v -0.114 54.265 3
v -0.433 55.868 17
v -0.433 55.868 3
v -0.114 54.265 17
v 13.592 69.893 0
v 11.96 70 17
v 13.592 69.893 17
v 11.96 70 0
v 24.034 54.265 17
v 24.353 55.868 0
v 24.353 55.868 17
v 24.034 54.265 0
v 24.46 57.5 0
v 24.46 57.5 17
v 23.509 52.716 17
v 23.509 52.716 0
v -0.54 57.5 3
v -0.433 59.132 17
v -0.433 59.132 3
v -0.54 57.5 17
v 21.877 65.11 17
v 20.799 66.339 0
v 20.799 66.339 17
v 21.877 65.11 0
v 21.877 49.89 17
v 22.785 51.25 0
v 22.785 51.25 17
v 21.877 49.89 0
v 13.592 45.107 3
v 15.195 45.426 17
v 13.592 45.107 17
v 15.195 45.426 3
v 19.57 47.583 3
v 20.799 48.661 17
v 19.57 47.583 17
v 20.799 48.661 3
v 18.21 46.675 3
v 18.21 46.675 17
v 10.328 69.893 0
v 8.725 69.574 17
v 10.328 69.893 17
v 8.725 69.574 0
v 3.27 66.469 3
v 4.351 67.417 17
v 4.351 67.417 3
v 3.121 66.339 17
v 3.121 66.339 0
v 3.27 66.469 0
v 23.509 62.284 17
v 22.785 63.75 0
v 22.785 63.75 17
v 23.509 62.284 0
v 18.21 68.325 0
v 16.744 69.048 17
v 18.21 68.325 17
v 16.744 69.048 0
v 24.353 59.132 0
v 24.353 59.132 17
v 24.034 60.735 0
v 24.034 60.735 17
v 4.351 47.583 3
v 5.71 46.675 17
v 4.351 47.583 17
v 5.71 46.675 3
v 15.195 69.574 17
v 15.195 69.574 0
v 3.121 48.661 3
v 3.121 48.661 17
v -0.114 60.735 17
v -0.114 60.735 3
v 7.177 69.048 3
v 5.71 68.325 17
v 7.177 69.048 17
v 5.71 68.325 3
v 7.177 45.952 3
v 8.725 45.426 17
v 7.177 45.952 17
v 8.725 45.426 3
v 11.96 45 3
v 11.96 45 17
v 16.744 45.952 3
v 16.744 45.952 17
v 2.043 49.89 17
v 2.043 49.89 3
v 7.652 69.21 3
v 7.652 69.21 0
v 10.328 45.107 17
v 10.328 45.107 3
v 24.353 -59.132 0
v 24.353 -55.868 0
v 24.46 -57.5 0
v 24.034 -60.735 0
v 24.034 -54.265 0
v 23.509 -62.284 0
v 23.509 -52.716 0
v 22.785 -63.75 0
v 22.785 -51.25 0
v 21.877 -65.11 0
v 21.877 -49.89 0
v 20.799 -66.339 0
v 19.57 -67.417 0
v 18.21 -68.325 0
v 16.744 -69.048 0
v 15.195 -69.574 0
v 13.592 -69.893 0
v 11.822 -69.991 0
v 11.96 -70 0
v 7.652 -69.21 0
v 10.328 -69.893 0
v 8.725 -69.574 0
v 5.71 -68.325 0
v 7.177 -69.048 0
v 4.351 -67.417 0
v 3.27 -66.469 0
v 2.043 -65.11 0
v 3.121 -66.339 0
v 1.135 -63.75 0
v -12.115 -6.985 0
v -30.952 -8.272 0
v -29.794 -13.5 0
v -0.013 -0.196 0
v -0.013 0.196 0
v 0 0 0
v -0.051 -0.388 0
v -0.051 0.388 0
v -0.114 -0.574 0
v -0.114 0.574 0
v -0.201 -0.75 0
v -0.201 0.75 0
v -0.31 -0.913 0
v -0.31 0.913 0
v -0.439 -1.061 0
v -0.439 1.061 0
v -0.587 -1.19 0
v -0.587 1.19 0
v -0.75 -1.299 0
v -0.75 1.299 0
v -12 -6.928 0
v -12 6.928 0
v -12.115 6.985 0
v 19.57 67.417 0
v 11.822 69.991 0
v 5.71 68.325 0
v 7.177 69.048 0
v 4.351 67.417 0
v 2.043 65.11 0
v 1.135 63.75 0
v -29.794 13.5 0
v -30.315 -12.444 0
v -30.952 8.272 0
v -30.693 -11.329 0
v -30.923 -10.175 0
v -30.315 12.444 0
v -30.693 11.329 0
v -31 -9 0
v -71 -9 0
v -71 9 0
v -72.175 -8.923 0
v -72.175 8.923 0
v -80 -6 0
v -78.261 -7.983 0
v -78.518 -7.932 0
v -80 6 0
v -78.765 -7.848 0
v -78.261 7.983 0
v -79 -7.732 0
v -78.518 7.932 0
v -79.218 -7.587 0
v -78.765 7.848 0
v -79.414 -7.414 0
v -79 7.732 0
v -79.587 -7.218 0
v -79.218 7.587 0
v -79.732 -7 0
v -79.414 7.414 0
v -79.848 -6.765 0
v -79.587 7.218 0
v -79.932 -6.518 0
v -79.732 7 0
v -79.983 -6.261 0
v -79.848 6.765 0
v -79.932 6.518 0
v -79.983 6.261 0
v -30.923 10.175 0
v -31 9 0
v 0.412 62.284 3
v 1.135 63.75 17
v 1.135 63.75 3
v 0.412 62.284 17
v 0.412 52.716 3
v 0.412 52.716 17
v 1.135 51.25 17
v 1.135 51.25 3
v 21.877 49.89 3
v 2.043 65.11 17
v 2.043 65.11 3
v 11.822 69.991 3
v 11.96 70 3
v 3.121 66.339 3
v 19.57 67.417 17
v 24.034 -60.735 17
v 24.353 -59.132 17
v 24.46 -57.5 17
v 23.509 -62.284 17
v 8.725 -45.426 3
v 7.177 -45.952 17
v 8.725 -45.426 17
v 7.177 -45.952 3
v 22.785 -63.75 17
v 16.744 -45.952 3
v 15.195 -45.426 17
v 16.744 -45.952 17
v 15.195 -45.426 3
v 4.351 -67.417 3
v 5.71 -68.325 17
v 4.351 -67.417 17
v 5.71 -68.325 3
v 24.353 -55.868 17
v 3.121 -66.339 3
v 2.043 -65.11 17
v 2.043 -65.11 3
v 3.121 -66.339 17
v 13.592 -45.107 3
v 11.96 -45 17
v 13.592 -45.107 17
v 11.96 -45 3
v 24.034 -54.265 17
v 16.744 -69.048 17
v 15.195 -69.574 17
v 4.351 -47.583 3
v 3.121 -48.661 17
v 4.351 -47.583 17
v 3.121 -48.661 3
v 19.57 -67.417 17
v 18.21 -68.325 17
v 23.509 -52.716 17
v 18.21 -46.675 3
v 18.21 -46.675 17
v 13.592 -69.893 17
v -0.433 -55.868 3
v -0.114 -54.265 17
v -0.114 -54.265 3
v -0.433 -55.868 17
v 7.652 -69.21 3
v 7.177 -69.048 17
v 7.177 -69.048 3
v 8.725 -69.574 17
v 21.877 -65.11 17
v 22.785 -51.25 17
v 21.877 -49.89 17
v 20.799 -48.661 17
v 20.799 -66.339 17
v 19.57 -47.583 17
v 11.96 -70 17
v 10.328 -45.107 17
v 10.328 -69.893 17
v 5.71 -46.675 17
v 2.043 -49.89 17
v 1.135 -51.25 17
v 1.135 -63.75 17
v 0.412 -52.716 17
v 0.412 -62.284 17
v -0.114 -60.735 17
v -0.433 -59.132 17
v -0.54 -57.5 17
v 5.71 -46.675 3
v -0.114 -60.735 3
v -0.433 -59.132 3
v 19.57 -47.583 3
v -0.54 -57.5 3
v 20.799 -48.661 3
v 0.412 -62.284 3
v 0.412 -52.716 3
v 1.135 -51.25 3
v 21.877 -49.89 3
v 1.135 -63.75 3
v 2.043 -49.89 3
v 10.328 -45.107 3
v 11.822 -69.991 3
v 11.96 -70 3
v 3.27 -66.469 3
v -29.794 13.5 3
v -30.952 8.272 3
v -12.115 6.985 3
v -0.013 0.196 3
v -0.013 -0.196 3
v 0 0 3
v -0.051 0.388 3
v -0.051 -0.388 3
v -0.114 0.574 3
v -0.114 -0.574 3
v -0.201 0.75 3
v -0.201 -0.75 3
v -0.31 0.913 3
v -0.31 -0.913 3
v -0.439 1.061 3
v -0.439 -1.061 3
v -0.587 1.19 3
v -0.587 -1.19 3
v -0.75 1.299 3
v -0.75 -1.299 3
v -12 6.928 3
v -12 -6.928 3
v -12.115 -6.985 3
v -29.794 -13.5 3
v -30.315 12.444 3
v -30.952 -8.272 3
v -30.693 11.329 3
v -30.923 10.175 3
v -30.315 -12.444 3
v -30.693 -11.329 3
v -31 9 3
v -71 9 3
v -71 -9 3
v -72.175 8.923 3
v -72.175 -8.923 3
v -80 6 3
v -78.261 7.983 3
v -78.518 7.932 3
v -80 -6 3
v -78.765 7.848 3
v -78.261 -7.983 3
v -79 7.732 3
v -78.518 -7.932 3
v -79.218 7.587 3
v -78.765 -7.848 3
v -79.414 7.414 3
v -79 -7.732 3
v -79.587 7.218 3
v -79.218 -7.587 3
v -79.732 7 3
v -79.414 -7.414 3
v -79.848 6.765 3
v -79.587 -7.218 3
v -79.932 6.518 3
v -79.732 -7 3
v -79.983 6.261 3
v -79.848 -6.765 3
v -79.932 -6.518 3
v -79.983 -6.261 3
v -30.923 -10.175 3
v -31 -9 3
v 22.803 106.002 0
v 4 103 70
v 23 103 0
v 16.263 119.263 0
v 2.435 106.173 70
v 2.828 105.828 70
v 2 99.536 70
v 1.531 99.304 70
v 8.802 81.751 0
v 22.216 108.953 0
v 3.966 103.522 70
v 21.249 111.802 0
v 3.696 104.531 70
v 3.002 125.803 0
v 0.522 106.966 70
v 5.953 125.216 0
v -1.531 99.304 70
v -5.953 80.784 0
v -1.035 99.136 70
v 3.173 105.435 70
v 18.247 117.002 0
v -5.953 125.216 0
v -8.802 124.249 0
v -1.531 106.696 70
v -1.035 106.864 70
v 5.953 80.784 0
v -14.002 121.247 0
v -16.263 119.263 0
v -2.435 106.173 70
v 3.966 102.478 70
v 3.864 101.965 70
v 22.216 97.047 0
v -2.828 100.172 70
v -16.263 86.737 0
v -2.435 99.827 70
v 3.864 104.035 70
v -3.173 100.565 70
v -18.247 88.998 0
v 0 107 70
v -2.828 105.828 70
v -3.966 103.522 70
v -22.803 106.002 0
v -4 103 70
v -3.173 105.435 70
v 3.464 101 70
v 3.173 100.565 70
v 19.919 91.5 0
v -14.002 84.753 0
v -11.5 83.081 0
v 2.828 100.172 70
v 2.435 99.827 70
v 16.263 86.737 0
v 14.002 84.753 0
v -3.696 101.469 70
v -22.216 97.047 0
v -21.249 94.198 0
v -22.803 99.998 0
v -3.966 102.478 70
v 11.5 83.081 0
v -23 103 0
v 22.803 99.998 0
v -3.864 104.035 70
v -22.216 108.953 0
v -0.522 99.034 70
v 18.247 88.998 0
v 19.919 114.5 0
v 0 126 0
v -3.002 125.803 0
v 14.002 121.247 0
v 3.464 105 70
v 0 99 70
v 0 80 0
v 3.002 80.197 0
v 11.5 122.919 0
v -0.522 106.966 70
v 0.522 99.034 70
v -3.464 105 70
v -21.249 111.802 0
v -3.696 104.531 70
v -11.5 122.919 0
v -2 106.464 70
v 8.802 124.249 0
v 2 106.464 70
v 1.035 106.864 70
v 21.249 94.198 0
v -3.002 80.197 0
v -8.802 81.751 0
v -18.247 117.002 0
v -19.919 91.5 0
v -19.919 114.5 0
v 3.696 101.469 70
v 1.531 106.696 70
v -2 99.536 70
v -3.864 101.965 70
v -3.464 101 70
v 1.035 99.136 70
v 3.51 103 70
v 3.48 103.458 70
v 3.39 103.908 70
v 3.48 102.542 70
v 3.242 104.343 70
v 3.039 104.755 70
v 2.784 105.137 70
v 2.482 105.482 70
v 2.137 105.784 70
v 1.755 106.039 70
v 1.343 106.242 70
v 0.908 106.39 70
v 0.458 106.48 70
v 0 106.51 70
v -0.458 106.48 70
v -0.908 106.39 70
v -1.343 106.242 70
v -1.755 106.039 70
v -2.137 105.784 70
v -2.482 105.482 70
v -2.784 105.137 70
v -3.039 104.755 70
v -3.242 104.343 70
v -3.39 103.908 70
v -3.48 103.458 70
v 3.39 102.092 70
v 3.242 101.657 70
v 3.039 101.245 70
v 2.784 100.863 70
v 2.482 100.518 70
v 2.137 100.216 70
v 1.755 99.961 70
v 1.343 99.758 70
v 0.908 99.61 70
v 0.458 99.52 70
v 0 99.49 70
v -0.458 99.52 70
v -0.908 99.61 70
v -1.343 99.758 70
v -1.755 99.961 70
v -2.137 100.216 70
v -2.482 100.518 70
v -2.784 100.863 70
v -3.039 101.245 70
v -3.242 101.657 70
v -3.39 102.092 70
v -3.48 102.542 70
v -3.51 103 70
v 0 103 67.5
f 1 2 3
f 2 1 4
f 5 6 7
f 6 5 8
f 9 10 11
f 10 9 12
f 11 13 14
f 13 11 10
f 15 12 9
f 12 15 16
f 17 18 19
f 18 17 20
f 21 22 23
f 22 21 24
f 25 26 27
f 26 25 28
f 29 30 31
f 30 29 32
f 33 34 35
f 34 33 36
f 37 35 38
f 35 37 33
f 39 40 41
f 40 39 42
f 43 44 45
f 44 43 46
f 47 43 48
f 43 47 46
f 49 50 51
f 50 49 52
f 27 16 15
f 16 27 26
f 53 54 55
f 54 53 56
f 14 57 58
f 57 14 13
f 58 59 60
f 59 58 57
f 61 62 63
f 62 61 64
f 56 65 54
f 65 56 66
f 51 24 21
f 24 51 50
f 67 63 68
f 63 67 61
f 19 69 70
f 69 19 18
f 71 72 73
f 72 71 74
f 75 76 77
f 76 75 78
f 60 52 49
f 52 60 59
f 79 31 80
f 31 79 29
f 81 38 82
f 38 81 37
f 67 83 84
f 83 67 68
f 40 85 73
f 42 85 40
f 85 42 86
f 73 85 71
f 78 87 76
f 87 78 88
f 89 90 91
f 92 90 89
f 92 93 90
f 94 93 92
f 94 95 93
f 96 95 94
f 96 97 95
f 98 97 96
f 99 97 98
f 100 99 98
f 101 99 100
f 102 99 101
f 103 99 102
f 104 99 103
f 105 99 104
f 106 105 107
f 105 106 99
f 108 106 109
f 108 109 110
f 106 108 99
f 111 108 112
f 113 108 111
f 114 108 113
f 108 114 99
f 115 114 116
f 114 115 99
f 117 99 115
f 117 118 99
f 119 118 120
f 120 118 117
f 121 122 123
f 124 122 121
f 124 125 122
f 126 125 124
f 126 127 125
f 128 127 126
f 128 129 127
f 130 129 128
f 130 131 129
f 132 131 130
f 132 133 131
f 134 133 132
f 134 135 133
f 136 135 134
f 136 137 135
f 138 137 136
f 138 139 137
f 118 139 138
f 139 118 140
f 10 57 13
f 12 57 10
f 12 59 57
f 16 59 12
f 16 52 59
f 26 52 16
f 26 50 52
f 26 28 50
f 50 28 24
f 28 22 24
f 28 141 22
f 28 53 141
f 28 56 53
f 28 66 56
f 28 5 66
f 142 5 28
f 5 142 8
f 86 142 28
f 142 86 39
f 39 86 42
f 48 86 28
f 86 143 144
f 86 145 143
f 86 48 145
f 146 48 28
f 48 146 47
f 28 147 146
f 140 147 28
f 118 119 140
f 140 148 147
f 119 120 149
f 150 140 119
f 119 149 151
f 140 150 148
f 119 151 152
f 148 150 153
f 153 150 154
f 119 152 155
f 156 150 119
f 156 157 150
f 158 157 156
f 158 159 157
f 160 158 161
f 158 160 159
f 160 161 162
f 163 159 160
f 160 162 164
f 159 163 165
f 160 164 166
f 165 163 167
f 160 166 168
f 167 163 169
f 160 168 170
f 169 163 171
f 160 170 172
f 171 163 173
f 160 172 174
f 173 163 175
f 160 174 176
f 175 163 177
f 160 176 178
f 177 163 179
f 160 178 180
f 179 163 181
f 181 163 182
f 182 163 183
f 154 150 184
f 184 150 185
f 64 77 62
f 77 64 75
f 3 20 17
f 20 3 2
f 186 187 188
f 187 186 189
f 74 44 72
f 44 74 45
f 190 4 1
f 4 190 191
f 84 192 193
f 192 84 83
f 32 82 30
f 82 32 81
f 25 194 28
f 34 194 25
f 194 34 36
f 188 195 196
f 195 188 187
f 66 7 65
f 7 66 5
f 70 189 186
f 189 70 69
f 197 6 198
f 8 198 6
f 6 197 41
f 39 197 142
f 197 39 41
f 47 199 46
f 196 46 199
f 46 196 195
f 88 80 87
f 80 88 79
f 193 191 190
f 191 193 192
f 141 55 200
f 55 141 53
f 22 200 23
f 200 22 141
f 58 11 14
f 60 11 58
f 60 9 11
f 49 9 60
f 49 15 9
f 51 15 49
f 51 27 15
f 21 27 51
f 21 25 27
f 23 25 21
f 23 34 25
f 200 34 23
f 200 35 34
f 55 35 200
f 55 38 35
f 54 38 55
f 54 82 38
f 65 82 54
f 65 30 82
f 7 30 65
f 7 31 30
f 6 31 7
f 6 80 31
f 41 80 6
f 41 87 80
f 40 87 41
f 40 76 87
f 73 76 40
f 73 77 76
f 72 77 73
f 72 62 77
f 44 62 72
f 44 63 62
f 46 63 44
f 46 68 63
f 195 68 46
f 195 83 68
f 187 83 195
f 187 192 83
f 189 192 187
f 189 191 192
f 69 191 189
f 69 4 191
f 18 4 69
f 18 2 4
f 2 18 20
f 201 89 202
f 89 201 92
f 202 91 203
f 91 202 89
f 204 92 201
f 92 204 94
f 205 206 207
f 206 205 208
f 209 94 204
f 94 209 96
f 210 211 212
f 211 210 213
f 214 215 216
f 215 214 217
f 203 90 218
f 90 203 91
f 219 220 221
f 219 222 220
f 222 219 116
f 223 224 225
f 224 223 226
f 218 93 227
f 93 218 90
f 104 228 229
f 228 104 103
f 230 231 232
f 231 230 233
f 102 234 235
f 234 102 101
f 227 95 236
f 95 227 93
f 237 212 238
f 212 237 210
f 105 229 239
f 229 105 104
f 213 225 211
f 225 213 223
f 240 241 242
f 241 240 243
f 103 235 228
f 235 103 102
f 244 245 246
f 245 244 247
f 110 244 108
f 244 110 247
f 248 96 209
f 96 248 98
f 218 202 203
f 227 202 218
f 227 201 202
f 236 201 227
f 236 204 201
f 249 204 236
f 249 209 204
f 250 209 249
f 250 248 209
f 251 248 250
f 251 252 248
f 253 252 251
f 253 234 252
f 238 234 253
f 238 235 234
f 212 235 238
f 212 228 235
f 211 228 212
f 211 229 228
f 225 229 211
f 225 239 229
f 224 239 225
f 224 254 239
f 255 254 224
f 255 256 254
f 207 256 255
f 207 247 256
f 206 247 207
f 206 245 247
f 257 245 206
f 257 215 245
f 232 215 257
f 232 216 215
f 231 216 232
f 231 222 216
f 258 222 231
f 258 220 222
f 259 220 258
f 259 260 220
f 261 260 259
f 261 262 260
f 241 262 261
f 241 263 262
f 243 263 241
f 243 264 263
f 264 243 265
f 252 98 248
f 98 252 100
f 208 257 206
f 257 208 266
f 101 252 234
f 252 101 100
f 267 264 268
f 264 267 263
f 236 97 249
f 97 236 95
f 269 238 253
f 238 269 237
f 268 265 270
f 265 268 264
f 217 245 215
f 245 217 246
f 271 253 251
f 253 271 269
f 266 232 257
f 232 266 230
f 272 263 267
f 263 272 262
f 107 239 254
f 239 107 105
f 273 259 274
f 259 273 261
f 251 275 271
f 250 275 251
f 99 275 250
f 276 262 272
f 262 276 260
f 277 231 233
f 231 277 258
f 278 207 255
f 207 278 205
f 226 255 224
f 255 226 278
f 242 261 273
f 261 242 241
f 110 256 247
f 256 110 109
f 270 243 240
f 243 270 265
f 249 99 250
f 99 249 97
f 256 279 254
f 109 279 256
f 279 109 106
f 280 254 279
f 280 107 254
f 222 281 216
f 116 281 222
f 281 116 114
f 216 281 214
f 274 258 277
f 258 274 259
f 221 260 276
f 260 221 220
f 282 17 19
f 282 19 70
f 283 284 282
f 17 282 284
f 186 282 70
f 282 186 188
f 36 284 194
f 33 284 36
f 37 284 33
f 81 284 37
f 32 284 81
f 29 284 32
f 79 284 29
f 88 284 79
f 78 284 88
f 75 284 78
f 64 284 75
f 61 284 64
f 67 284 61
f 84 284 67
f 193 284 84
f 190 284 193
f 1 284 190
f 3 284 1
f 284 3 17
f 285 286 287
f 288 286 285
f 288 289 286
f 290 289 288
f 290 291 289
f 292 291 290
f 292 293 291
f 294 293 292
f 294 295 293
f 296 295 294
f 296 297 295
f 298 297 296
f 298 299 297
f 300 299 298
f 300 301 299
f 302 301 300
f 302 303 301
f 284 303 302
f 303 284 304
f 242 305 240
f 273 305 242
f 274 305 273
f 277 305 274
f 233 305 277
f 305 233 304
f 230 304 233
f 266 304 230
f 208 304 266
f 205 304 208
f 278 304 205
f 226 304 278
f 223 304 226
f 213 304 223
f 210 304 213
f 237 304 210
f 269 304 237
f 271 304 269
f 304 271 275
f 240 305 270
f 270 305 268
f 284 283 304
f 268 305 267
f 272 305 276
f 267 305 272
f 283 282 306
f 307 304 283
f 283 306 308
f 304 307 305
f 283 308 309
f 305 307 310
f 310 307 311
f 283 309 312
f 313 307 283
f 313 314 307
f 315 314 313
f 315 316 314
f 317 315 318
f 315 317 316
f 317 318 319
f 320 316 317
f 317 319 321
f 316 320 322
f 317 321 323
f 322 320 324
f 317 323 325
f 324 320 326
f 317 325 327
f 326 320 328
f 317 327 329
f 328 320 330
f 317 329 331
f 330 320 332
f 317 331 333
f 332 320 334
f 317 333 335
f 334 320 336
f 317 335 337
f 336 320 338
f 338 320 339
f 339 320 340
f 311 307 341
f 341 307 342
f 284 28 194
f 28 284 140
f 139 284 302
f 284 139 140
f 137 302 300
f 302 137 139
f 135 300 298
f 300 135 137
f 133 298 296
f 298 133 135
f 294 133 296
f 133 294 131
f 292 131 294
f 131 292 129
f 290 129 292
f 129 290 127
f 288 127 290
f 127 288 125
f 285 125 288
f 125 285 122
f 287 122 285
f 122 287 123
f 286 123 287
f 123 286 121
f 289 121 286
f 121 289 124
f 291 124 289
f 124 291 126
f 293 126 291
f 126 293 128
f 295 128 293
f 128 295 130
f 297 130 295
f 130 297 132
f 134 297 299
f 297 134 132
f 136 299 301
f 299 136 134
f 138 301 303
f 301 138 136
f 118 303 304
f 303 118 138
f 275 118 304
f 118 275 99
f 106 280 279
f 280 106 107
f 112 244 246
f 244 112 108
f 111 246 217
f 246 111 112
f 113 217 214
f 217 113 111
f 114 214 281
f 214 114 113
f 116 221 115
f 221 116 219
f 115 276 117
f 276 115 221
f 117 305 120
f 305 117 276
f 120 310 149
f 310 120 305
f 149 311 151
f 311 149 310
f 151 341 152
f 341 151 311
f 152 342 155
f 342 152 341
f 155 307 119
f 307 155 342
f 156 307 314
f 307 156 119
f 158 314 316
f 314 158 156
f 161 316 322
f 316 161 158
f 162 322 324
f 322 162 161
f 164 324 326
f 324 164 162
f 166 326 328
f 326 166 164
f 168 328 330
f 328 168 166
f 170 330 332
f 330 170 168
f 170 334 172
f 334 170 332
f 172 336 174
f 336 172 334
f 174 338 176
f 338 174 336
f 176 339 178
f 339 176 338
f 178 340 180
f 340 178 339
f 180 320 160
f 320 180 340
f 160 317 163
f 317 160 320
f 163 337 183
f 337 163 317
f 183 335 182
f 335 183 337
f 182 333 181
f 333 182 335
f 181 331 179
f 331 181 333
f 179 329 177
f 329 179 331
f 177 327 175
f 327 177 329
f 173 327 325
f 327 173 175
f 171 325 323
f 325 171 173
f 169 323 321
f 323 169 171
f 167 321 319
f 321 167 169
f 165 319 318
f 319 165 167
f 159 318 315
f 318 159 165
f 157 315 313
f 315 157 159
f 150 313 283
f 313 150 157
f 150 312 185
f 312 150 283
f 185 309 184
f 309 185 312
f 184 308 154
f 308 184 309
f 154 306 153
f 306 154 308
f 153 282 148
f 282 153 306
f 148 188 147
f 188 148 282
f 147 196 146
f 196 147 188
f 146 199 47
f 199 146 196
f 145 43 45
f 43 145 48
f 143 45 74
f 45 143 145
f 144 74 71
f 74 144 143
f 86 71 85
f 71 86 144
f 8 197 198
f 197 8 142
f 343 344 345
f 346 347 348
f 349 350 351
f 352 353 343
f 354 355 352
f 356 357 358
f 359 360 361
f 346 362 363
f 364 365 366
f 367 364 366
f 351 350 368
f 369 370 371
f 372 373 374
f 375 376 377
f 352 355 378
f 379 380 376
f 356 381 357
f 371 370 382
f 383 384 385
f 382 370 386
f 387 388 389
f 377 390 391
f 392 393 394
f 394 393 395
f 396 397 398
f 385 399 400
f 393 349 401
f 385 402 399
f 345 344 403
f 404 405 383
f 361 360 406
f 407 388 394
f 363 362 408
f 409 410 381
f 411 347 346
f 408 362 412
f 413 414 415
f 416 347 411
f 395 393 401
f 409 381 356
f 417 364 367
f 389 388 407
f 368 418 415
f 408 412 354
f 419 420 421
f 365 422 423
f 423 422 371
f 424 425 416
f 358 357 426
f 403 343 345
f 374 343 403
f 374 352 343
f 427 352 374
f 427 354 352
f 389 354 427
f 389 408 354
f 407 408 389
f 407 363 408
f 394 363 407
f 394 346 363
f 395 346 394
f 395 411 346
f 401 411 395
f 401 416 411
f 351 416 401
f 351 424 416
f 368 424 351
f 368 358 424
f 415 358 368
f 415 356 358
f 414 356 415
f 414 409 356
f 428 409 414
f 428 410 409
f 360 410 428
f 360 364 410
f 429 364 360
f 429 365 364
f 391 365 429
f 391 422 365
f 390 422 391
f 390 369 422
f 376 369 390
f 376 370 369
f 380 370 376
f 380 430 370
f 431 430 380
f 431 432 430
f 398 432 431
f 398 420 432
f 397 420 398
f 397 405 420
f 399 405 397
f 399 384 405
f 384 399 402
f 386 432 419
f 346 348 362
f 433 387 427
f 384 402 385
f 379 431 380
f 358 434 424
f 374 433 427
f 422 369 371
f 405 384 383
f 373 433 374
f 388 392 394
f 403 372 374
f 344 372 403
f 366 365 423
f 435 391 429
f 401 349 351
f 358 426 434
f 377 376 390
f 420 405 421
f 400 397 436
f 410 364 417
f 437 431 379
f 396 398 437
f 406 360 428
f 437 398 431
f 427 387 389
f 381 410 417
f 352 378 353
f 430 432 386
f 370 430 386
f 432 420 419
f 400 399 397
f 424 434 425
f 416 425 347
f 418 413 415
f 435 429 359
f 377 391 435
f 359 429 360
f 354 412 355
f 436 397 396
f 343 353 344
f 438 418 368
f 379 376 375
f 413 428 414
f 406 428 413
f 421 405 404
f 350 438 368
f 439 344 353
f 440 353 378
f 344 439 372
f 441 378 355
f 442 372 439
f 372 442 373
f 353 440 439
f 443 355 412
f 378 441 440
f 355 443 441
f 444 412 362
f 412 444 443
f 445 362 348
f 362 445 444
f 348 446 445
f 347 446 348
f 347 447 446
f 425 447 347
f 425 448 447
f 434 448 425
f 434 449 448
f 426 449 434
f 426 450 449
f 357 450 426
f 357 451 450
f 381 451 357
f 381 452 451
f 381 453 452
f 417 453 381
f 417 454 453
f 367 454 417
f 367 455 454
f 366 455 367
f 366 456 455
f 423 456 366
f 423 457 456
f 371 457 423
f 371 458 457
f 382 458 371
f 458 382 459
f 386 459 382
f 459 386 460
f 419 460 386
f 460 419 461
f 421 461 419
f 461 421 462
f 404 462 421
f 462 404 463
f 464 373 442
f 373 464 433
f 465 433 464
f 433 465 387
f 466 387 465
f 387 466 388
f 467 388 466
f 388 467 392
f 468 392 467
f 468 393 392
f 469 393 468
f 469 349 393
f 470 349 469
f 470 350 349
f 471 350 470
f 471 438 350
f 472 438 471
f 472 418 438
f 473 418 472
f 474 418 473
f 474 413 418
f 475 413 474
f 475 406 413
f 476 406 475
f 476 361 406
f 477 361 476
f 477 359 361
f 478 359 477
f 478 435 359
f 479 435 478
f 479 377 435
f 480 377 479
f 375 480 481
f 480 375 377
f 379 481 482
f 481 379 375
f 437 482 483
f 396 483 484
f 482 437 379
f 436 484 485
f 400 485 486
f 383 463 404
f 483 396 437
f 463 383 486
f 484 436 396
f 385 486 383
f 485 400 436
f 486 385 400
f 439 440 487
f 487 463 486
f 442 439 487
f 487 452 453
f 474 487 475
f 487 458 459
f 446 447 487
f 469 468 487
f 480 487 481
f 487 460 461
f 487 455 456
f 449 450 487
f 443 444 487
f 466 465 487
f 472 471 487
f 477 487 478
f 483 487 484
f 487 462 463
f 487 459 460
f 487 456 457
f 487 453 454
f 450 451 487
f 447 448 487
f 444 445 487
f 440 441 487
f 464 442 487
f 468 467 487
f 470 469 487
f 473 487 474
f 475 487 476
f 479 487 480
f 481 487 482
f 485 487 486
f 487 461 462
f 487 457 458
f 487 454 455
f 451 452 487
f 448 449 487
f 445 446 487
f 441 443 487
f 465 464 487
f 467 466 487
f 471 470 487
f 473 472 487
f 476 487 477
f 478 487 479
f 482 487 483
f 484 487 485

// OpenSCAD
// @name Balancing Bird
// @description Center-of-mass toy: a bird that balances on its beak tip, plus a cone stand to perch it on.
// @tags toy, physics, balance, bird, educational
//
// The classic balancing-bird toy. The bird is a flat plate with
// forward-swept wings; heavy wingtip bosses hang BELOW beak level and
// ahead of the beak, pulling the center of mass to a point directly
// under the beak tip. Resting the beak in the stand's dimple, the bird
// hangs pendulum-stable because its center of mass sits below the
// support point.
//
// The bird is modeled in its balance frame: BEAK TIP AT THE ORIGIN,
// +x forward, z up. Balance is verified on the rendered mesh with
// scripts/check_stl.js (volume centroid, uniform-density assumption -
// valid for a solid single-material print):
//
//   BALANCE REQUIREMENT (assert-style, checked on the exported mesh):
//     |centroid.x| <= 1.5  &&  |centroid.y| <= 1.5  &&  centroid.z < 0
//   VERIFIED at the defaults below (weight_mode="solid",
//   wingspan=140, sweep_angle=35, body_length=80, plate_thickness=3,
//   pocket_diameter=20, tip_drop=14):
//     centroid = [-0.42, 0.00, -2.87] mm, volume = 26631 mm^3
//   i.e. the center of mass sits 0.4mm behind and 2.9mm BELOW the beak
//   tip contact point - pendulum-stable. If you change bird parameters,
//   re-render and re-check the centroid (uniform density assumed).
//
// Wingtip weights: weight_mode="solid" prints solid PLA bosses sized
// to balance on their own. weight_mode="coin" opens a pocket in each
// boss (facing DOWN in use, facing UP on the print bed) for coins -
// with EMPTY pockets the centroid measures [-3.29, 0.00, -1.22] (tail
// heavy): coin mode balances once coins are inserted (coin mass sits
// low and forward of the beak, which restores and deepens stability).
//
// Printing: the bird prints FLAT ON ITS BACK - its top surface is one
// flat plane (plate top, boss tops flush), so flipped upside-down the
// whole silhouette rests on the bed and the wingtip bosses are plain
// vertical cylinders growing upward. No supports, no bridges; coin
// pockets print as upward-facing blind holes. The stand prints upright
// on its base (wall angle ~74 degrees from horizontal, dimple faces up).

/* [Bird] */
// Wingtip-to-wingtip span (mm)
wingspan = 140; // [100:10:200]

// Forward wing sweep, degrees from straight-sideways
sweep_angle = 35; // [20:1:45]

// Beak tip to tail length (mm)
body_length = 80; // [60:5:110]

// Plate thickness (mm)
plate_thickness = 3; // [2:0.5:5]

/* [Wingtip Weights] */
// Solid printed tips, or open pockets for coins
weight_mode = "solid"; // ["solid", "coin"]

// Weight pocket diameter (mm) - also sets boss size (pocket + 5mm wall). 20 fits most small coins.
pocket_diameter = 20; // [14:1:26]

// Pocket depth for coins (mm)
pocket_depth = 8; // [4:1:12]

// How far the wingtip bosses hang below beak level (mm)
tip_drop = 14; // [8:2:24]

/* [Stand] */
// Cone stand height (mm)
stand_height = 70; // [50:5:100]

// Cone stand base diameter (mm)
stand_base = 46; // [36:2:60]

/* [Display] */
// What to show
_display_mode = "all"; // ["all", "bird", "stand", "balanced"]

/* [Advanced] */
$fn = 48;

// ---- Derived geometry (balance frame: beak tip at origin) ----

_t = plate_thickness;
_half = wingspan / 2;
_wall = 2.5;
_boss_d = pocket_diameter + 2 * _wall;

// Silhouette anchors (tuned together with the defaults above so the
// centroid lands under the beak tip - see VERIFIED comment)
_beak_tip_r = 1.5;
_head_c = [-16, 0];   _head_r = 8;
_sh_x = 22;           _sh_y = 9;    _sh_r = 9;   // wing shoulder
_tail_r = 9;
_tail_c = [-body_length + _tail_r, 0];

// Wingtip boss centers: outer edge of the boss defines the wingspan
_tip_y = _half - _boss_d / 2;
_tip_x = -_sh_x + (_tip_y - _sh_y) * tan(sweep_angle);

// Display gap between bird and stand in "balanced" mode
_eps = 0.3;

assert(_tip_y > _sh_y + 5,
    str("Wingspan ", wingspan, " too small for pocket_diameter ", pocket_diameter));
assert(pocket_depth <= tip_drop + _t - 1.5,
    str("pocket_depth ", pocket_depth, " leaves <1.5mm floor; increase tip_drop"));
assert(tip_drop < stand_height - 10,
    str("tip_drop ", tip_drop, " too large: wingtips would hit the table before the beak reaches the stand"));
assert(body_length > _sh_x + _sh_r + _tail_r + 5,
    "body_length too short for the wing shoulder");

// ---- Bird ----

module _silhouette_2d() {
    // beak + head
    hull() {
        translate([-_beak_tip_r, 0]) circle(_beak_tip_r); // tip reaches x=0
        translate(_head_c) circle(_head_r);
    }
    // body: head to tail teardrop
    hull() {
        translate(_head_c) circle(_head_r);
        translate(_tail_c) circle(_tail_r);
    }
    // tail fan
    hull() {
        translate(_tail_c) circle(_tail_r);
        translate([-body_length + 2, -6]) circle(2);
        translate([-body_length + 2, 6]) circle(2);
    }
    // forward-swept wings
    for (s = [-1, 1]) hull() {
        translate([-_sh_x, s * _sh_y]) circle(_sh_r);
        translate([_tip_x, s * _tip_y]) circle(_boss_d / 2);
    }
}

// The bird in its balance frame: beak tip at [0,0,0], plate on z[0,t],
// wingtip bosses hanging down to z = -tip_drop.
module bird_balance() {
    difference() {
        union() {
            linear_extrude(height = _t) _silhouette_2d();
            for (s = [-1, 1])
                translate([_tip_x, s * _tip_y, -tip_drop])
                    cylinder(d = _boss_d, h = tip_drop + _t);
        }
        if (weight_mode == "coin")
            for (s = [-1, 1])
                translate([_tip_x, s * _tip_y, -tip_drop - 0.1])
                    cylinder(d = pocket_diameter, h = pocket_depth + 0.1);
    }
}

// Print pose: flipped onto its flat back, everything on the plate
module bird_print() {
    translate([0, 0, _t]) rotate([180, 0, 0]) bird_balance();
}

// ---- Stand ----

// Cone stand, base on z=0, beak dimple in the top face
module stand() {
    difference() {
        cylinder(d1 = stand_base, d2 = 8, h = stand_height);
        // conical dimple, overshooting the top face
        translate([0, 0, stand_height - 2.5])
            cylinder(d1 = 0, d2 = 7.3, h = 2.6);
    }
}

// ---- Display ----

// Accessor for the verification harness
function bird_tip_drop() = tip_drop;

if (_display_mode == "all") {
    color("SkyBlue") bird_print();
    color("BurlyWood")
        translate([0, _half + stand_base / 2 + 10, 0]) stand();
} else if (_display_mode == "bird") {
    color("SkyBlue") bird_print();
} else if (_display_mode == "stand") {
    color("BurlyWood") stand();
} else if (_display_mode == "balanced") {
    // Beak tip at the origin; stand rim a display-epsilon below it.
    // The bird touches the stand only (conceptually) at the beak point.
    color("SkyBlue") bird_balance();
    color("BurlyWood") translate([0, 0, -stand_height - _eps]) stand();
}
